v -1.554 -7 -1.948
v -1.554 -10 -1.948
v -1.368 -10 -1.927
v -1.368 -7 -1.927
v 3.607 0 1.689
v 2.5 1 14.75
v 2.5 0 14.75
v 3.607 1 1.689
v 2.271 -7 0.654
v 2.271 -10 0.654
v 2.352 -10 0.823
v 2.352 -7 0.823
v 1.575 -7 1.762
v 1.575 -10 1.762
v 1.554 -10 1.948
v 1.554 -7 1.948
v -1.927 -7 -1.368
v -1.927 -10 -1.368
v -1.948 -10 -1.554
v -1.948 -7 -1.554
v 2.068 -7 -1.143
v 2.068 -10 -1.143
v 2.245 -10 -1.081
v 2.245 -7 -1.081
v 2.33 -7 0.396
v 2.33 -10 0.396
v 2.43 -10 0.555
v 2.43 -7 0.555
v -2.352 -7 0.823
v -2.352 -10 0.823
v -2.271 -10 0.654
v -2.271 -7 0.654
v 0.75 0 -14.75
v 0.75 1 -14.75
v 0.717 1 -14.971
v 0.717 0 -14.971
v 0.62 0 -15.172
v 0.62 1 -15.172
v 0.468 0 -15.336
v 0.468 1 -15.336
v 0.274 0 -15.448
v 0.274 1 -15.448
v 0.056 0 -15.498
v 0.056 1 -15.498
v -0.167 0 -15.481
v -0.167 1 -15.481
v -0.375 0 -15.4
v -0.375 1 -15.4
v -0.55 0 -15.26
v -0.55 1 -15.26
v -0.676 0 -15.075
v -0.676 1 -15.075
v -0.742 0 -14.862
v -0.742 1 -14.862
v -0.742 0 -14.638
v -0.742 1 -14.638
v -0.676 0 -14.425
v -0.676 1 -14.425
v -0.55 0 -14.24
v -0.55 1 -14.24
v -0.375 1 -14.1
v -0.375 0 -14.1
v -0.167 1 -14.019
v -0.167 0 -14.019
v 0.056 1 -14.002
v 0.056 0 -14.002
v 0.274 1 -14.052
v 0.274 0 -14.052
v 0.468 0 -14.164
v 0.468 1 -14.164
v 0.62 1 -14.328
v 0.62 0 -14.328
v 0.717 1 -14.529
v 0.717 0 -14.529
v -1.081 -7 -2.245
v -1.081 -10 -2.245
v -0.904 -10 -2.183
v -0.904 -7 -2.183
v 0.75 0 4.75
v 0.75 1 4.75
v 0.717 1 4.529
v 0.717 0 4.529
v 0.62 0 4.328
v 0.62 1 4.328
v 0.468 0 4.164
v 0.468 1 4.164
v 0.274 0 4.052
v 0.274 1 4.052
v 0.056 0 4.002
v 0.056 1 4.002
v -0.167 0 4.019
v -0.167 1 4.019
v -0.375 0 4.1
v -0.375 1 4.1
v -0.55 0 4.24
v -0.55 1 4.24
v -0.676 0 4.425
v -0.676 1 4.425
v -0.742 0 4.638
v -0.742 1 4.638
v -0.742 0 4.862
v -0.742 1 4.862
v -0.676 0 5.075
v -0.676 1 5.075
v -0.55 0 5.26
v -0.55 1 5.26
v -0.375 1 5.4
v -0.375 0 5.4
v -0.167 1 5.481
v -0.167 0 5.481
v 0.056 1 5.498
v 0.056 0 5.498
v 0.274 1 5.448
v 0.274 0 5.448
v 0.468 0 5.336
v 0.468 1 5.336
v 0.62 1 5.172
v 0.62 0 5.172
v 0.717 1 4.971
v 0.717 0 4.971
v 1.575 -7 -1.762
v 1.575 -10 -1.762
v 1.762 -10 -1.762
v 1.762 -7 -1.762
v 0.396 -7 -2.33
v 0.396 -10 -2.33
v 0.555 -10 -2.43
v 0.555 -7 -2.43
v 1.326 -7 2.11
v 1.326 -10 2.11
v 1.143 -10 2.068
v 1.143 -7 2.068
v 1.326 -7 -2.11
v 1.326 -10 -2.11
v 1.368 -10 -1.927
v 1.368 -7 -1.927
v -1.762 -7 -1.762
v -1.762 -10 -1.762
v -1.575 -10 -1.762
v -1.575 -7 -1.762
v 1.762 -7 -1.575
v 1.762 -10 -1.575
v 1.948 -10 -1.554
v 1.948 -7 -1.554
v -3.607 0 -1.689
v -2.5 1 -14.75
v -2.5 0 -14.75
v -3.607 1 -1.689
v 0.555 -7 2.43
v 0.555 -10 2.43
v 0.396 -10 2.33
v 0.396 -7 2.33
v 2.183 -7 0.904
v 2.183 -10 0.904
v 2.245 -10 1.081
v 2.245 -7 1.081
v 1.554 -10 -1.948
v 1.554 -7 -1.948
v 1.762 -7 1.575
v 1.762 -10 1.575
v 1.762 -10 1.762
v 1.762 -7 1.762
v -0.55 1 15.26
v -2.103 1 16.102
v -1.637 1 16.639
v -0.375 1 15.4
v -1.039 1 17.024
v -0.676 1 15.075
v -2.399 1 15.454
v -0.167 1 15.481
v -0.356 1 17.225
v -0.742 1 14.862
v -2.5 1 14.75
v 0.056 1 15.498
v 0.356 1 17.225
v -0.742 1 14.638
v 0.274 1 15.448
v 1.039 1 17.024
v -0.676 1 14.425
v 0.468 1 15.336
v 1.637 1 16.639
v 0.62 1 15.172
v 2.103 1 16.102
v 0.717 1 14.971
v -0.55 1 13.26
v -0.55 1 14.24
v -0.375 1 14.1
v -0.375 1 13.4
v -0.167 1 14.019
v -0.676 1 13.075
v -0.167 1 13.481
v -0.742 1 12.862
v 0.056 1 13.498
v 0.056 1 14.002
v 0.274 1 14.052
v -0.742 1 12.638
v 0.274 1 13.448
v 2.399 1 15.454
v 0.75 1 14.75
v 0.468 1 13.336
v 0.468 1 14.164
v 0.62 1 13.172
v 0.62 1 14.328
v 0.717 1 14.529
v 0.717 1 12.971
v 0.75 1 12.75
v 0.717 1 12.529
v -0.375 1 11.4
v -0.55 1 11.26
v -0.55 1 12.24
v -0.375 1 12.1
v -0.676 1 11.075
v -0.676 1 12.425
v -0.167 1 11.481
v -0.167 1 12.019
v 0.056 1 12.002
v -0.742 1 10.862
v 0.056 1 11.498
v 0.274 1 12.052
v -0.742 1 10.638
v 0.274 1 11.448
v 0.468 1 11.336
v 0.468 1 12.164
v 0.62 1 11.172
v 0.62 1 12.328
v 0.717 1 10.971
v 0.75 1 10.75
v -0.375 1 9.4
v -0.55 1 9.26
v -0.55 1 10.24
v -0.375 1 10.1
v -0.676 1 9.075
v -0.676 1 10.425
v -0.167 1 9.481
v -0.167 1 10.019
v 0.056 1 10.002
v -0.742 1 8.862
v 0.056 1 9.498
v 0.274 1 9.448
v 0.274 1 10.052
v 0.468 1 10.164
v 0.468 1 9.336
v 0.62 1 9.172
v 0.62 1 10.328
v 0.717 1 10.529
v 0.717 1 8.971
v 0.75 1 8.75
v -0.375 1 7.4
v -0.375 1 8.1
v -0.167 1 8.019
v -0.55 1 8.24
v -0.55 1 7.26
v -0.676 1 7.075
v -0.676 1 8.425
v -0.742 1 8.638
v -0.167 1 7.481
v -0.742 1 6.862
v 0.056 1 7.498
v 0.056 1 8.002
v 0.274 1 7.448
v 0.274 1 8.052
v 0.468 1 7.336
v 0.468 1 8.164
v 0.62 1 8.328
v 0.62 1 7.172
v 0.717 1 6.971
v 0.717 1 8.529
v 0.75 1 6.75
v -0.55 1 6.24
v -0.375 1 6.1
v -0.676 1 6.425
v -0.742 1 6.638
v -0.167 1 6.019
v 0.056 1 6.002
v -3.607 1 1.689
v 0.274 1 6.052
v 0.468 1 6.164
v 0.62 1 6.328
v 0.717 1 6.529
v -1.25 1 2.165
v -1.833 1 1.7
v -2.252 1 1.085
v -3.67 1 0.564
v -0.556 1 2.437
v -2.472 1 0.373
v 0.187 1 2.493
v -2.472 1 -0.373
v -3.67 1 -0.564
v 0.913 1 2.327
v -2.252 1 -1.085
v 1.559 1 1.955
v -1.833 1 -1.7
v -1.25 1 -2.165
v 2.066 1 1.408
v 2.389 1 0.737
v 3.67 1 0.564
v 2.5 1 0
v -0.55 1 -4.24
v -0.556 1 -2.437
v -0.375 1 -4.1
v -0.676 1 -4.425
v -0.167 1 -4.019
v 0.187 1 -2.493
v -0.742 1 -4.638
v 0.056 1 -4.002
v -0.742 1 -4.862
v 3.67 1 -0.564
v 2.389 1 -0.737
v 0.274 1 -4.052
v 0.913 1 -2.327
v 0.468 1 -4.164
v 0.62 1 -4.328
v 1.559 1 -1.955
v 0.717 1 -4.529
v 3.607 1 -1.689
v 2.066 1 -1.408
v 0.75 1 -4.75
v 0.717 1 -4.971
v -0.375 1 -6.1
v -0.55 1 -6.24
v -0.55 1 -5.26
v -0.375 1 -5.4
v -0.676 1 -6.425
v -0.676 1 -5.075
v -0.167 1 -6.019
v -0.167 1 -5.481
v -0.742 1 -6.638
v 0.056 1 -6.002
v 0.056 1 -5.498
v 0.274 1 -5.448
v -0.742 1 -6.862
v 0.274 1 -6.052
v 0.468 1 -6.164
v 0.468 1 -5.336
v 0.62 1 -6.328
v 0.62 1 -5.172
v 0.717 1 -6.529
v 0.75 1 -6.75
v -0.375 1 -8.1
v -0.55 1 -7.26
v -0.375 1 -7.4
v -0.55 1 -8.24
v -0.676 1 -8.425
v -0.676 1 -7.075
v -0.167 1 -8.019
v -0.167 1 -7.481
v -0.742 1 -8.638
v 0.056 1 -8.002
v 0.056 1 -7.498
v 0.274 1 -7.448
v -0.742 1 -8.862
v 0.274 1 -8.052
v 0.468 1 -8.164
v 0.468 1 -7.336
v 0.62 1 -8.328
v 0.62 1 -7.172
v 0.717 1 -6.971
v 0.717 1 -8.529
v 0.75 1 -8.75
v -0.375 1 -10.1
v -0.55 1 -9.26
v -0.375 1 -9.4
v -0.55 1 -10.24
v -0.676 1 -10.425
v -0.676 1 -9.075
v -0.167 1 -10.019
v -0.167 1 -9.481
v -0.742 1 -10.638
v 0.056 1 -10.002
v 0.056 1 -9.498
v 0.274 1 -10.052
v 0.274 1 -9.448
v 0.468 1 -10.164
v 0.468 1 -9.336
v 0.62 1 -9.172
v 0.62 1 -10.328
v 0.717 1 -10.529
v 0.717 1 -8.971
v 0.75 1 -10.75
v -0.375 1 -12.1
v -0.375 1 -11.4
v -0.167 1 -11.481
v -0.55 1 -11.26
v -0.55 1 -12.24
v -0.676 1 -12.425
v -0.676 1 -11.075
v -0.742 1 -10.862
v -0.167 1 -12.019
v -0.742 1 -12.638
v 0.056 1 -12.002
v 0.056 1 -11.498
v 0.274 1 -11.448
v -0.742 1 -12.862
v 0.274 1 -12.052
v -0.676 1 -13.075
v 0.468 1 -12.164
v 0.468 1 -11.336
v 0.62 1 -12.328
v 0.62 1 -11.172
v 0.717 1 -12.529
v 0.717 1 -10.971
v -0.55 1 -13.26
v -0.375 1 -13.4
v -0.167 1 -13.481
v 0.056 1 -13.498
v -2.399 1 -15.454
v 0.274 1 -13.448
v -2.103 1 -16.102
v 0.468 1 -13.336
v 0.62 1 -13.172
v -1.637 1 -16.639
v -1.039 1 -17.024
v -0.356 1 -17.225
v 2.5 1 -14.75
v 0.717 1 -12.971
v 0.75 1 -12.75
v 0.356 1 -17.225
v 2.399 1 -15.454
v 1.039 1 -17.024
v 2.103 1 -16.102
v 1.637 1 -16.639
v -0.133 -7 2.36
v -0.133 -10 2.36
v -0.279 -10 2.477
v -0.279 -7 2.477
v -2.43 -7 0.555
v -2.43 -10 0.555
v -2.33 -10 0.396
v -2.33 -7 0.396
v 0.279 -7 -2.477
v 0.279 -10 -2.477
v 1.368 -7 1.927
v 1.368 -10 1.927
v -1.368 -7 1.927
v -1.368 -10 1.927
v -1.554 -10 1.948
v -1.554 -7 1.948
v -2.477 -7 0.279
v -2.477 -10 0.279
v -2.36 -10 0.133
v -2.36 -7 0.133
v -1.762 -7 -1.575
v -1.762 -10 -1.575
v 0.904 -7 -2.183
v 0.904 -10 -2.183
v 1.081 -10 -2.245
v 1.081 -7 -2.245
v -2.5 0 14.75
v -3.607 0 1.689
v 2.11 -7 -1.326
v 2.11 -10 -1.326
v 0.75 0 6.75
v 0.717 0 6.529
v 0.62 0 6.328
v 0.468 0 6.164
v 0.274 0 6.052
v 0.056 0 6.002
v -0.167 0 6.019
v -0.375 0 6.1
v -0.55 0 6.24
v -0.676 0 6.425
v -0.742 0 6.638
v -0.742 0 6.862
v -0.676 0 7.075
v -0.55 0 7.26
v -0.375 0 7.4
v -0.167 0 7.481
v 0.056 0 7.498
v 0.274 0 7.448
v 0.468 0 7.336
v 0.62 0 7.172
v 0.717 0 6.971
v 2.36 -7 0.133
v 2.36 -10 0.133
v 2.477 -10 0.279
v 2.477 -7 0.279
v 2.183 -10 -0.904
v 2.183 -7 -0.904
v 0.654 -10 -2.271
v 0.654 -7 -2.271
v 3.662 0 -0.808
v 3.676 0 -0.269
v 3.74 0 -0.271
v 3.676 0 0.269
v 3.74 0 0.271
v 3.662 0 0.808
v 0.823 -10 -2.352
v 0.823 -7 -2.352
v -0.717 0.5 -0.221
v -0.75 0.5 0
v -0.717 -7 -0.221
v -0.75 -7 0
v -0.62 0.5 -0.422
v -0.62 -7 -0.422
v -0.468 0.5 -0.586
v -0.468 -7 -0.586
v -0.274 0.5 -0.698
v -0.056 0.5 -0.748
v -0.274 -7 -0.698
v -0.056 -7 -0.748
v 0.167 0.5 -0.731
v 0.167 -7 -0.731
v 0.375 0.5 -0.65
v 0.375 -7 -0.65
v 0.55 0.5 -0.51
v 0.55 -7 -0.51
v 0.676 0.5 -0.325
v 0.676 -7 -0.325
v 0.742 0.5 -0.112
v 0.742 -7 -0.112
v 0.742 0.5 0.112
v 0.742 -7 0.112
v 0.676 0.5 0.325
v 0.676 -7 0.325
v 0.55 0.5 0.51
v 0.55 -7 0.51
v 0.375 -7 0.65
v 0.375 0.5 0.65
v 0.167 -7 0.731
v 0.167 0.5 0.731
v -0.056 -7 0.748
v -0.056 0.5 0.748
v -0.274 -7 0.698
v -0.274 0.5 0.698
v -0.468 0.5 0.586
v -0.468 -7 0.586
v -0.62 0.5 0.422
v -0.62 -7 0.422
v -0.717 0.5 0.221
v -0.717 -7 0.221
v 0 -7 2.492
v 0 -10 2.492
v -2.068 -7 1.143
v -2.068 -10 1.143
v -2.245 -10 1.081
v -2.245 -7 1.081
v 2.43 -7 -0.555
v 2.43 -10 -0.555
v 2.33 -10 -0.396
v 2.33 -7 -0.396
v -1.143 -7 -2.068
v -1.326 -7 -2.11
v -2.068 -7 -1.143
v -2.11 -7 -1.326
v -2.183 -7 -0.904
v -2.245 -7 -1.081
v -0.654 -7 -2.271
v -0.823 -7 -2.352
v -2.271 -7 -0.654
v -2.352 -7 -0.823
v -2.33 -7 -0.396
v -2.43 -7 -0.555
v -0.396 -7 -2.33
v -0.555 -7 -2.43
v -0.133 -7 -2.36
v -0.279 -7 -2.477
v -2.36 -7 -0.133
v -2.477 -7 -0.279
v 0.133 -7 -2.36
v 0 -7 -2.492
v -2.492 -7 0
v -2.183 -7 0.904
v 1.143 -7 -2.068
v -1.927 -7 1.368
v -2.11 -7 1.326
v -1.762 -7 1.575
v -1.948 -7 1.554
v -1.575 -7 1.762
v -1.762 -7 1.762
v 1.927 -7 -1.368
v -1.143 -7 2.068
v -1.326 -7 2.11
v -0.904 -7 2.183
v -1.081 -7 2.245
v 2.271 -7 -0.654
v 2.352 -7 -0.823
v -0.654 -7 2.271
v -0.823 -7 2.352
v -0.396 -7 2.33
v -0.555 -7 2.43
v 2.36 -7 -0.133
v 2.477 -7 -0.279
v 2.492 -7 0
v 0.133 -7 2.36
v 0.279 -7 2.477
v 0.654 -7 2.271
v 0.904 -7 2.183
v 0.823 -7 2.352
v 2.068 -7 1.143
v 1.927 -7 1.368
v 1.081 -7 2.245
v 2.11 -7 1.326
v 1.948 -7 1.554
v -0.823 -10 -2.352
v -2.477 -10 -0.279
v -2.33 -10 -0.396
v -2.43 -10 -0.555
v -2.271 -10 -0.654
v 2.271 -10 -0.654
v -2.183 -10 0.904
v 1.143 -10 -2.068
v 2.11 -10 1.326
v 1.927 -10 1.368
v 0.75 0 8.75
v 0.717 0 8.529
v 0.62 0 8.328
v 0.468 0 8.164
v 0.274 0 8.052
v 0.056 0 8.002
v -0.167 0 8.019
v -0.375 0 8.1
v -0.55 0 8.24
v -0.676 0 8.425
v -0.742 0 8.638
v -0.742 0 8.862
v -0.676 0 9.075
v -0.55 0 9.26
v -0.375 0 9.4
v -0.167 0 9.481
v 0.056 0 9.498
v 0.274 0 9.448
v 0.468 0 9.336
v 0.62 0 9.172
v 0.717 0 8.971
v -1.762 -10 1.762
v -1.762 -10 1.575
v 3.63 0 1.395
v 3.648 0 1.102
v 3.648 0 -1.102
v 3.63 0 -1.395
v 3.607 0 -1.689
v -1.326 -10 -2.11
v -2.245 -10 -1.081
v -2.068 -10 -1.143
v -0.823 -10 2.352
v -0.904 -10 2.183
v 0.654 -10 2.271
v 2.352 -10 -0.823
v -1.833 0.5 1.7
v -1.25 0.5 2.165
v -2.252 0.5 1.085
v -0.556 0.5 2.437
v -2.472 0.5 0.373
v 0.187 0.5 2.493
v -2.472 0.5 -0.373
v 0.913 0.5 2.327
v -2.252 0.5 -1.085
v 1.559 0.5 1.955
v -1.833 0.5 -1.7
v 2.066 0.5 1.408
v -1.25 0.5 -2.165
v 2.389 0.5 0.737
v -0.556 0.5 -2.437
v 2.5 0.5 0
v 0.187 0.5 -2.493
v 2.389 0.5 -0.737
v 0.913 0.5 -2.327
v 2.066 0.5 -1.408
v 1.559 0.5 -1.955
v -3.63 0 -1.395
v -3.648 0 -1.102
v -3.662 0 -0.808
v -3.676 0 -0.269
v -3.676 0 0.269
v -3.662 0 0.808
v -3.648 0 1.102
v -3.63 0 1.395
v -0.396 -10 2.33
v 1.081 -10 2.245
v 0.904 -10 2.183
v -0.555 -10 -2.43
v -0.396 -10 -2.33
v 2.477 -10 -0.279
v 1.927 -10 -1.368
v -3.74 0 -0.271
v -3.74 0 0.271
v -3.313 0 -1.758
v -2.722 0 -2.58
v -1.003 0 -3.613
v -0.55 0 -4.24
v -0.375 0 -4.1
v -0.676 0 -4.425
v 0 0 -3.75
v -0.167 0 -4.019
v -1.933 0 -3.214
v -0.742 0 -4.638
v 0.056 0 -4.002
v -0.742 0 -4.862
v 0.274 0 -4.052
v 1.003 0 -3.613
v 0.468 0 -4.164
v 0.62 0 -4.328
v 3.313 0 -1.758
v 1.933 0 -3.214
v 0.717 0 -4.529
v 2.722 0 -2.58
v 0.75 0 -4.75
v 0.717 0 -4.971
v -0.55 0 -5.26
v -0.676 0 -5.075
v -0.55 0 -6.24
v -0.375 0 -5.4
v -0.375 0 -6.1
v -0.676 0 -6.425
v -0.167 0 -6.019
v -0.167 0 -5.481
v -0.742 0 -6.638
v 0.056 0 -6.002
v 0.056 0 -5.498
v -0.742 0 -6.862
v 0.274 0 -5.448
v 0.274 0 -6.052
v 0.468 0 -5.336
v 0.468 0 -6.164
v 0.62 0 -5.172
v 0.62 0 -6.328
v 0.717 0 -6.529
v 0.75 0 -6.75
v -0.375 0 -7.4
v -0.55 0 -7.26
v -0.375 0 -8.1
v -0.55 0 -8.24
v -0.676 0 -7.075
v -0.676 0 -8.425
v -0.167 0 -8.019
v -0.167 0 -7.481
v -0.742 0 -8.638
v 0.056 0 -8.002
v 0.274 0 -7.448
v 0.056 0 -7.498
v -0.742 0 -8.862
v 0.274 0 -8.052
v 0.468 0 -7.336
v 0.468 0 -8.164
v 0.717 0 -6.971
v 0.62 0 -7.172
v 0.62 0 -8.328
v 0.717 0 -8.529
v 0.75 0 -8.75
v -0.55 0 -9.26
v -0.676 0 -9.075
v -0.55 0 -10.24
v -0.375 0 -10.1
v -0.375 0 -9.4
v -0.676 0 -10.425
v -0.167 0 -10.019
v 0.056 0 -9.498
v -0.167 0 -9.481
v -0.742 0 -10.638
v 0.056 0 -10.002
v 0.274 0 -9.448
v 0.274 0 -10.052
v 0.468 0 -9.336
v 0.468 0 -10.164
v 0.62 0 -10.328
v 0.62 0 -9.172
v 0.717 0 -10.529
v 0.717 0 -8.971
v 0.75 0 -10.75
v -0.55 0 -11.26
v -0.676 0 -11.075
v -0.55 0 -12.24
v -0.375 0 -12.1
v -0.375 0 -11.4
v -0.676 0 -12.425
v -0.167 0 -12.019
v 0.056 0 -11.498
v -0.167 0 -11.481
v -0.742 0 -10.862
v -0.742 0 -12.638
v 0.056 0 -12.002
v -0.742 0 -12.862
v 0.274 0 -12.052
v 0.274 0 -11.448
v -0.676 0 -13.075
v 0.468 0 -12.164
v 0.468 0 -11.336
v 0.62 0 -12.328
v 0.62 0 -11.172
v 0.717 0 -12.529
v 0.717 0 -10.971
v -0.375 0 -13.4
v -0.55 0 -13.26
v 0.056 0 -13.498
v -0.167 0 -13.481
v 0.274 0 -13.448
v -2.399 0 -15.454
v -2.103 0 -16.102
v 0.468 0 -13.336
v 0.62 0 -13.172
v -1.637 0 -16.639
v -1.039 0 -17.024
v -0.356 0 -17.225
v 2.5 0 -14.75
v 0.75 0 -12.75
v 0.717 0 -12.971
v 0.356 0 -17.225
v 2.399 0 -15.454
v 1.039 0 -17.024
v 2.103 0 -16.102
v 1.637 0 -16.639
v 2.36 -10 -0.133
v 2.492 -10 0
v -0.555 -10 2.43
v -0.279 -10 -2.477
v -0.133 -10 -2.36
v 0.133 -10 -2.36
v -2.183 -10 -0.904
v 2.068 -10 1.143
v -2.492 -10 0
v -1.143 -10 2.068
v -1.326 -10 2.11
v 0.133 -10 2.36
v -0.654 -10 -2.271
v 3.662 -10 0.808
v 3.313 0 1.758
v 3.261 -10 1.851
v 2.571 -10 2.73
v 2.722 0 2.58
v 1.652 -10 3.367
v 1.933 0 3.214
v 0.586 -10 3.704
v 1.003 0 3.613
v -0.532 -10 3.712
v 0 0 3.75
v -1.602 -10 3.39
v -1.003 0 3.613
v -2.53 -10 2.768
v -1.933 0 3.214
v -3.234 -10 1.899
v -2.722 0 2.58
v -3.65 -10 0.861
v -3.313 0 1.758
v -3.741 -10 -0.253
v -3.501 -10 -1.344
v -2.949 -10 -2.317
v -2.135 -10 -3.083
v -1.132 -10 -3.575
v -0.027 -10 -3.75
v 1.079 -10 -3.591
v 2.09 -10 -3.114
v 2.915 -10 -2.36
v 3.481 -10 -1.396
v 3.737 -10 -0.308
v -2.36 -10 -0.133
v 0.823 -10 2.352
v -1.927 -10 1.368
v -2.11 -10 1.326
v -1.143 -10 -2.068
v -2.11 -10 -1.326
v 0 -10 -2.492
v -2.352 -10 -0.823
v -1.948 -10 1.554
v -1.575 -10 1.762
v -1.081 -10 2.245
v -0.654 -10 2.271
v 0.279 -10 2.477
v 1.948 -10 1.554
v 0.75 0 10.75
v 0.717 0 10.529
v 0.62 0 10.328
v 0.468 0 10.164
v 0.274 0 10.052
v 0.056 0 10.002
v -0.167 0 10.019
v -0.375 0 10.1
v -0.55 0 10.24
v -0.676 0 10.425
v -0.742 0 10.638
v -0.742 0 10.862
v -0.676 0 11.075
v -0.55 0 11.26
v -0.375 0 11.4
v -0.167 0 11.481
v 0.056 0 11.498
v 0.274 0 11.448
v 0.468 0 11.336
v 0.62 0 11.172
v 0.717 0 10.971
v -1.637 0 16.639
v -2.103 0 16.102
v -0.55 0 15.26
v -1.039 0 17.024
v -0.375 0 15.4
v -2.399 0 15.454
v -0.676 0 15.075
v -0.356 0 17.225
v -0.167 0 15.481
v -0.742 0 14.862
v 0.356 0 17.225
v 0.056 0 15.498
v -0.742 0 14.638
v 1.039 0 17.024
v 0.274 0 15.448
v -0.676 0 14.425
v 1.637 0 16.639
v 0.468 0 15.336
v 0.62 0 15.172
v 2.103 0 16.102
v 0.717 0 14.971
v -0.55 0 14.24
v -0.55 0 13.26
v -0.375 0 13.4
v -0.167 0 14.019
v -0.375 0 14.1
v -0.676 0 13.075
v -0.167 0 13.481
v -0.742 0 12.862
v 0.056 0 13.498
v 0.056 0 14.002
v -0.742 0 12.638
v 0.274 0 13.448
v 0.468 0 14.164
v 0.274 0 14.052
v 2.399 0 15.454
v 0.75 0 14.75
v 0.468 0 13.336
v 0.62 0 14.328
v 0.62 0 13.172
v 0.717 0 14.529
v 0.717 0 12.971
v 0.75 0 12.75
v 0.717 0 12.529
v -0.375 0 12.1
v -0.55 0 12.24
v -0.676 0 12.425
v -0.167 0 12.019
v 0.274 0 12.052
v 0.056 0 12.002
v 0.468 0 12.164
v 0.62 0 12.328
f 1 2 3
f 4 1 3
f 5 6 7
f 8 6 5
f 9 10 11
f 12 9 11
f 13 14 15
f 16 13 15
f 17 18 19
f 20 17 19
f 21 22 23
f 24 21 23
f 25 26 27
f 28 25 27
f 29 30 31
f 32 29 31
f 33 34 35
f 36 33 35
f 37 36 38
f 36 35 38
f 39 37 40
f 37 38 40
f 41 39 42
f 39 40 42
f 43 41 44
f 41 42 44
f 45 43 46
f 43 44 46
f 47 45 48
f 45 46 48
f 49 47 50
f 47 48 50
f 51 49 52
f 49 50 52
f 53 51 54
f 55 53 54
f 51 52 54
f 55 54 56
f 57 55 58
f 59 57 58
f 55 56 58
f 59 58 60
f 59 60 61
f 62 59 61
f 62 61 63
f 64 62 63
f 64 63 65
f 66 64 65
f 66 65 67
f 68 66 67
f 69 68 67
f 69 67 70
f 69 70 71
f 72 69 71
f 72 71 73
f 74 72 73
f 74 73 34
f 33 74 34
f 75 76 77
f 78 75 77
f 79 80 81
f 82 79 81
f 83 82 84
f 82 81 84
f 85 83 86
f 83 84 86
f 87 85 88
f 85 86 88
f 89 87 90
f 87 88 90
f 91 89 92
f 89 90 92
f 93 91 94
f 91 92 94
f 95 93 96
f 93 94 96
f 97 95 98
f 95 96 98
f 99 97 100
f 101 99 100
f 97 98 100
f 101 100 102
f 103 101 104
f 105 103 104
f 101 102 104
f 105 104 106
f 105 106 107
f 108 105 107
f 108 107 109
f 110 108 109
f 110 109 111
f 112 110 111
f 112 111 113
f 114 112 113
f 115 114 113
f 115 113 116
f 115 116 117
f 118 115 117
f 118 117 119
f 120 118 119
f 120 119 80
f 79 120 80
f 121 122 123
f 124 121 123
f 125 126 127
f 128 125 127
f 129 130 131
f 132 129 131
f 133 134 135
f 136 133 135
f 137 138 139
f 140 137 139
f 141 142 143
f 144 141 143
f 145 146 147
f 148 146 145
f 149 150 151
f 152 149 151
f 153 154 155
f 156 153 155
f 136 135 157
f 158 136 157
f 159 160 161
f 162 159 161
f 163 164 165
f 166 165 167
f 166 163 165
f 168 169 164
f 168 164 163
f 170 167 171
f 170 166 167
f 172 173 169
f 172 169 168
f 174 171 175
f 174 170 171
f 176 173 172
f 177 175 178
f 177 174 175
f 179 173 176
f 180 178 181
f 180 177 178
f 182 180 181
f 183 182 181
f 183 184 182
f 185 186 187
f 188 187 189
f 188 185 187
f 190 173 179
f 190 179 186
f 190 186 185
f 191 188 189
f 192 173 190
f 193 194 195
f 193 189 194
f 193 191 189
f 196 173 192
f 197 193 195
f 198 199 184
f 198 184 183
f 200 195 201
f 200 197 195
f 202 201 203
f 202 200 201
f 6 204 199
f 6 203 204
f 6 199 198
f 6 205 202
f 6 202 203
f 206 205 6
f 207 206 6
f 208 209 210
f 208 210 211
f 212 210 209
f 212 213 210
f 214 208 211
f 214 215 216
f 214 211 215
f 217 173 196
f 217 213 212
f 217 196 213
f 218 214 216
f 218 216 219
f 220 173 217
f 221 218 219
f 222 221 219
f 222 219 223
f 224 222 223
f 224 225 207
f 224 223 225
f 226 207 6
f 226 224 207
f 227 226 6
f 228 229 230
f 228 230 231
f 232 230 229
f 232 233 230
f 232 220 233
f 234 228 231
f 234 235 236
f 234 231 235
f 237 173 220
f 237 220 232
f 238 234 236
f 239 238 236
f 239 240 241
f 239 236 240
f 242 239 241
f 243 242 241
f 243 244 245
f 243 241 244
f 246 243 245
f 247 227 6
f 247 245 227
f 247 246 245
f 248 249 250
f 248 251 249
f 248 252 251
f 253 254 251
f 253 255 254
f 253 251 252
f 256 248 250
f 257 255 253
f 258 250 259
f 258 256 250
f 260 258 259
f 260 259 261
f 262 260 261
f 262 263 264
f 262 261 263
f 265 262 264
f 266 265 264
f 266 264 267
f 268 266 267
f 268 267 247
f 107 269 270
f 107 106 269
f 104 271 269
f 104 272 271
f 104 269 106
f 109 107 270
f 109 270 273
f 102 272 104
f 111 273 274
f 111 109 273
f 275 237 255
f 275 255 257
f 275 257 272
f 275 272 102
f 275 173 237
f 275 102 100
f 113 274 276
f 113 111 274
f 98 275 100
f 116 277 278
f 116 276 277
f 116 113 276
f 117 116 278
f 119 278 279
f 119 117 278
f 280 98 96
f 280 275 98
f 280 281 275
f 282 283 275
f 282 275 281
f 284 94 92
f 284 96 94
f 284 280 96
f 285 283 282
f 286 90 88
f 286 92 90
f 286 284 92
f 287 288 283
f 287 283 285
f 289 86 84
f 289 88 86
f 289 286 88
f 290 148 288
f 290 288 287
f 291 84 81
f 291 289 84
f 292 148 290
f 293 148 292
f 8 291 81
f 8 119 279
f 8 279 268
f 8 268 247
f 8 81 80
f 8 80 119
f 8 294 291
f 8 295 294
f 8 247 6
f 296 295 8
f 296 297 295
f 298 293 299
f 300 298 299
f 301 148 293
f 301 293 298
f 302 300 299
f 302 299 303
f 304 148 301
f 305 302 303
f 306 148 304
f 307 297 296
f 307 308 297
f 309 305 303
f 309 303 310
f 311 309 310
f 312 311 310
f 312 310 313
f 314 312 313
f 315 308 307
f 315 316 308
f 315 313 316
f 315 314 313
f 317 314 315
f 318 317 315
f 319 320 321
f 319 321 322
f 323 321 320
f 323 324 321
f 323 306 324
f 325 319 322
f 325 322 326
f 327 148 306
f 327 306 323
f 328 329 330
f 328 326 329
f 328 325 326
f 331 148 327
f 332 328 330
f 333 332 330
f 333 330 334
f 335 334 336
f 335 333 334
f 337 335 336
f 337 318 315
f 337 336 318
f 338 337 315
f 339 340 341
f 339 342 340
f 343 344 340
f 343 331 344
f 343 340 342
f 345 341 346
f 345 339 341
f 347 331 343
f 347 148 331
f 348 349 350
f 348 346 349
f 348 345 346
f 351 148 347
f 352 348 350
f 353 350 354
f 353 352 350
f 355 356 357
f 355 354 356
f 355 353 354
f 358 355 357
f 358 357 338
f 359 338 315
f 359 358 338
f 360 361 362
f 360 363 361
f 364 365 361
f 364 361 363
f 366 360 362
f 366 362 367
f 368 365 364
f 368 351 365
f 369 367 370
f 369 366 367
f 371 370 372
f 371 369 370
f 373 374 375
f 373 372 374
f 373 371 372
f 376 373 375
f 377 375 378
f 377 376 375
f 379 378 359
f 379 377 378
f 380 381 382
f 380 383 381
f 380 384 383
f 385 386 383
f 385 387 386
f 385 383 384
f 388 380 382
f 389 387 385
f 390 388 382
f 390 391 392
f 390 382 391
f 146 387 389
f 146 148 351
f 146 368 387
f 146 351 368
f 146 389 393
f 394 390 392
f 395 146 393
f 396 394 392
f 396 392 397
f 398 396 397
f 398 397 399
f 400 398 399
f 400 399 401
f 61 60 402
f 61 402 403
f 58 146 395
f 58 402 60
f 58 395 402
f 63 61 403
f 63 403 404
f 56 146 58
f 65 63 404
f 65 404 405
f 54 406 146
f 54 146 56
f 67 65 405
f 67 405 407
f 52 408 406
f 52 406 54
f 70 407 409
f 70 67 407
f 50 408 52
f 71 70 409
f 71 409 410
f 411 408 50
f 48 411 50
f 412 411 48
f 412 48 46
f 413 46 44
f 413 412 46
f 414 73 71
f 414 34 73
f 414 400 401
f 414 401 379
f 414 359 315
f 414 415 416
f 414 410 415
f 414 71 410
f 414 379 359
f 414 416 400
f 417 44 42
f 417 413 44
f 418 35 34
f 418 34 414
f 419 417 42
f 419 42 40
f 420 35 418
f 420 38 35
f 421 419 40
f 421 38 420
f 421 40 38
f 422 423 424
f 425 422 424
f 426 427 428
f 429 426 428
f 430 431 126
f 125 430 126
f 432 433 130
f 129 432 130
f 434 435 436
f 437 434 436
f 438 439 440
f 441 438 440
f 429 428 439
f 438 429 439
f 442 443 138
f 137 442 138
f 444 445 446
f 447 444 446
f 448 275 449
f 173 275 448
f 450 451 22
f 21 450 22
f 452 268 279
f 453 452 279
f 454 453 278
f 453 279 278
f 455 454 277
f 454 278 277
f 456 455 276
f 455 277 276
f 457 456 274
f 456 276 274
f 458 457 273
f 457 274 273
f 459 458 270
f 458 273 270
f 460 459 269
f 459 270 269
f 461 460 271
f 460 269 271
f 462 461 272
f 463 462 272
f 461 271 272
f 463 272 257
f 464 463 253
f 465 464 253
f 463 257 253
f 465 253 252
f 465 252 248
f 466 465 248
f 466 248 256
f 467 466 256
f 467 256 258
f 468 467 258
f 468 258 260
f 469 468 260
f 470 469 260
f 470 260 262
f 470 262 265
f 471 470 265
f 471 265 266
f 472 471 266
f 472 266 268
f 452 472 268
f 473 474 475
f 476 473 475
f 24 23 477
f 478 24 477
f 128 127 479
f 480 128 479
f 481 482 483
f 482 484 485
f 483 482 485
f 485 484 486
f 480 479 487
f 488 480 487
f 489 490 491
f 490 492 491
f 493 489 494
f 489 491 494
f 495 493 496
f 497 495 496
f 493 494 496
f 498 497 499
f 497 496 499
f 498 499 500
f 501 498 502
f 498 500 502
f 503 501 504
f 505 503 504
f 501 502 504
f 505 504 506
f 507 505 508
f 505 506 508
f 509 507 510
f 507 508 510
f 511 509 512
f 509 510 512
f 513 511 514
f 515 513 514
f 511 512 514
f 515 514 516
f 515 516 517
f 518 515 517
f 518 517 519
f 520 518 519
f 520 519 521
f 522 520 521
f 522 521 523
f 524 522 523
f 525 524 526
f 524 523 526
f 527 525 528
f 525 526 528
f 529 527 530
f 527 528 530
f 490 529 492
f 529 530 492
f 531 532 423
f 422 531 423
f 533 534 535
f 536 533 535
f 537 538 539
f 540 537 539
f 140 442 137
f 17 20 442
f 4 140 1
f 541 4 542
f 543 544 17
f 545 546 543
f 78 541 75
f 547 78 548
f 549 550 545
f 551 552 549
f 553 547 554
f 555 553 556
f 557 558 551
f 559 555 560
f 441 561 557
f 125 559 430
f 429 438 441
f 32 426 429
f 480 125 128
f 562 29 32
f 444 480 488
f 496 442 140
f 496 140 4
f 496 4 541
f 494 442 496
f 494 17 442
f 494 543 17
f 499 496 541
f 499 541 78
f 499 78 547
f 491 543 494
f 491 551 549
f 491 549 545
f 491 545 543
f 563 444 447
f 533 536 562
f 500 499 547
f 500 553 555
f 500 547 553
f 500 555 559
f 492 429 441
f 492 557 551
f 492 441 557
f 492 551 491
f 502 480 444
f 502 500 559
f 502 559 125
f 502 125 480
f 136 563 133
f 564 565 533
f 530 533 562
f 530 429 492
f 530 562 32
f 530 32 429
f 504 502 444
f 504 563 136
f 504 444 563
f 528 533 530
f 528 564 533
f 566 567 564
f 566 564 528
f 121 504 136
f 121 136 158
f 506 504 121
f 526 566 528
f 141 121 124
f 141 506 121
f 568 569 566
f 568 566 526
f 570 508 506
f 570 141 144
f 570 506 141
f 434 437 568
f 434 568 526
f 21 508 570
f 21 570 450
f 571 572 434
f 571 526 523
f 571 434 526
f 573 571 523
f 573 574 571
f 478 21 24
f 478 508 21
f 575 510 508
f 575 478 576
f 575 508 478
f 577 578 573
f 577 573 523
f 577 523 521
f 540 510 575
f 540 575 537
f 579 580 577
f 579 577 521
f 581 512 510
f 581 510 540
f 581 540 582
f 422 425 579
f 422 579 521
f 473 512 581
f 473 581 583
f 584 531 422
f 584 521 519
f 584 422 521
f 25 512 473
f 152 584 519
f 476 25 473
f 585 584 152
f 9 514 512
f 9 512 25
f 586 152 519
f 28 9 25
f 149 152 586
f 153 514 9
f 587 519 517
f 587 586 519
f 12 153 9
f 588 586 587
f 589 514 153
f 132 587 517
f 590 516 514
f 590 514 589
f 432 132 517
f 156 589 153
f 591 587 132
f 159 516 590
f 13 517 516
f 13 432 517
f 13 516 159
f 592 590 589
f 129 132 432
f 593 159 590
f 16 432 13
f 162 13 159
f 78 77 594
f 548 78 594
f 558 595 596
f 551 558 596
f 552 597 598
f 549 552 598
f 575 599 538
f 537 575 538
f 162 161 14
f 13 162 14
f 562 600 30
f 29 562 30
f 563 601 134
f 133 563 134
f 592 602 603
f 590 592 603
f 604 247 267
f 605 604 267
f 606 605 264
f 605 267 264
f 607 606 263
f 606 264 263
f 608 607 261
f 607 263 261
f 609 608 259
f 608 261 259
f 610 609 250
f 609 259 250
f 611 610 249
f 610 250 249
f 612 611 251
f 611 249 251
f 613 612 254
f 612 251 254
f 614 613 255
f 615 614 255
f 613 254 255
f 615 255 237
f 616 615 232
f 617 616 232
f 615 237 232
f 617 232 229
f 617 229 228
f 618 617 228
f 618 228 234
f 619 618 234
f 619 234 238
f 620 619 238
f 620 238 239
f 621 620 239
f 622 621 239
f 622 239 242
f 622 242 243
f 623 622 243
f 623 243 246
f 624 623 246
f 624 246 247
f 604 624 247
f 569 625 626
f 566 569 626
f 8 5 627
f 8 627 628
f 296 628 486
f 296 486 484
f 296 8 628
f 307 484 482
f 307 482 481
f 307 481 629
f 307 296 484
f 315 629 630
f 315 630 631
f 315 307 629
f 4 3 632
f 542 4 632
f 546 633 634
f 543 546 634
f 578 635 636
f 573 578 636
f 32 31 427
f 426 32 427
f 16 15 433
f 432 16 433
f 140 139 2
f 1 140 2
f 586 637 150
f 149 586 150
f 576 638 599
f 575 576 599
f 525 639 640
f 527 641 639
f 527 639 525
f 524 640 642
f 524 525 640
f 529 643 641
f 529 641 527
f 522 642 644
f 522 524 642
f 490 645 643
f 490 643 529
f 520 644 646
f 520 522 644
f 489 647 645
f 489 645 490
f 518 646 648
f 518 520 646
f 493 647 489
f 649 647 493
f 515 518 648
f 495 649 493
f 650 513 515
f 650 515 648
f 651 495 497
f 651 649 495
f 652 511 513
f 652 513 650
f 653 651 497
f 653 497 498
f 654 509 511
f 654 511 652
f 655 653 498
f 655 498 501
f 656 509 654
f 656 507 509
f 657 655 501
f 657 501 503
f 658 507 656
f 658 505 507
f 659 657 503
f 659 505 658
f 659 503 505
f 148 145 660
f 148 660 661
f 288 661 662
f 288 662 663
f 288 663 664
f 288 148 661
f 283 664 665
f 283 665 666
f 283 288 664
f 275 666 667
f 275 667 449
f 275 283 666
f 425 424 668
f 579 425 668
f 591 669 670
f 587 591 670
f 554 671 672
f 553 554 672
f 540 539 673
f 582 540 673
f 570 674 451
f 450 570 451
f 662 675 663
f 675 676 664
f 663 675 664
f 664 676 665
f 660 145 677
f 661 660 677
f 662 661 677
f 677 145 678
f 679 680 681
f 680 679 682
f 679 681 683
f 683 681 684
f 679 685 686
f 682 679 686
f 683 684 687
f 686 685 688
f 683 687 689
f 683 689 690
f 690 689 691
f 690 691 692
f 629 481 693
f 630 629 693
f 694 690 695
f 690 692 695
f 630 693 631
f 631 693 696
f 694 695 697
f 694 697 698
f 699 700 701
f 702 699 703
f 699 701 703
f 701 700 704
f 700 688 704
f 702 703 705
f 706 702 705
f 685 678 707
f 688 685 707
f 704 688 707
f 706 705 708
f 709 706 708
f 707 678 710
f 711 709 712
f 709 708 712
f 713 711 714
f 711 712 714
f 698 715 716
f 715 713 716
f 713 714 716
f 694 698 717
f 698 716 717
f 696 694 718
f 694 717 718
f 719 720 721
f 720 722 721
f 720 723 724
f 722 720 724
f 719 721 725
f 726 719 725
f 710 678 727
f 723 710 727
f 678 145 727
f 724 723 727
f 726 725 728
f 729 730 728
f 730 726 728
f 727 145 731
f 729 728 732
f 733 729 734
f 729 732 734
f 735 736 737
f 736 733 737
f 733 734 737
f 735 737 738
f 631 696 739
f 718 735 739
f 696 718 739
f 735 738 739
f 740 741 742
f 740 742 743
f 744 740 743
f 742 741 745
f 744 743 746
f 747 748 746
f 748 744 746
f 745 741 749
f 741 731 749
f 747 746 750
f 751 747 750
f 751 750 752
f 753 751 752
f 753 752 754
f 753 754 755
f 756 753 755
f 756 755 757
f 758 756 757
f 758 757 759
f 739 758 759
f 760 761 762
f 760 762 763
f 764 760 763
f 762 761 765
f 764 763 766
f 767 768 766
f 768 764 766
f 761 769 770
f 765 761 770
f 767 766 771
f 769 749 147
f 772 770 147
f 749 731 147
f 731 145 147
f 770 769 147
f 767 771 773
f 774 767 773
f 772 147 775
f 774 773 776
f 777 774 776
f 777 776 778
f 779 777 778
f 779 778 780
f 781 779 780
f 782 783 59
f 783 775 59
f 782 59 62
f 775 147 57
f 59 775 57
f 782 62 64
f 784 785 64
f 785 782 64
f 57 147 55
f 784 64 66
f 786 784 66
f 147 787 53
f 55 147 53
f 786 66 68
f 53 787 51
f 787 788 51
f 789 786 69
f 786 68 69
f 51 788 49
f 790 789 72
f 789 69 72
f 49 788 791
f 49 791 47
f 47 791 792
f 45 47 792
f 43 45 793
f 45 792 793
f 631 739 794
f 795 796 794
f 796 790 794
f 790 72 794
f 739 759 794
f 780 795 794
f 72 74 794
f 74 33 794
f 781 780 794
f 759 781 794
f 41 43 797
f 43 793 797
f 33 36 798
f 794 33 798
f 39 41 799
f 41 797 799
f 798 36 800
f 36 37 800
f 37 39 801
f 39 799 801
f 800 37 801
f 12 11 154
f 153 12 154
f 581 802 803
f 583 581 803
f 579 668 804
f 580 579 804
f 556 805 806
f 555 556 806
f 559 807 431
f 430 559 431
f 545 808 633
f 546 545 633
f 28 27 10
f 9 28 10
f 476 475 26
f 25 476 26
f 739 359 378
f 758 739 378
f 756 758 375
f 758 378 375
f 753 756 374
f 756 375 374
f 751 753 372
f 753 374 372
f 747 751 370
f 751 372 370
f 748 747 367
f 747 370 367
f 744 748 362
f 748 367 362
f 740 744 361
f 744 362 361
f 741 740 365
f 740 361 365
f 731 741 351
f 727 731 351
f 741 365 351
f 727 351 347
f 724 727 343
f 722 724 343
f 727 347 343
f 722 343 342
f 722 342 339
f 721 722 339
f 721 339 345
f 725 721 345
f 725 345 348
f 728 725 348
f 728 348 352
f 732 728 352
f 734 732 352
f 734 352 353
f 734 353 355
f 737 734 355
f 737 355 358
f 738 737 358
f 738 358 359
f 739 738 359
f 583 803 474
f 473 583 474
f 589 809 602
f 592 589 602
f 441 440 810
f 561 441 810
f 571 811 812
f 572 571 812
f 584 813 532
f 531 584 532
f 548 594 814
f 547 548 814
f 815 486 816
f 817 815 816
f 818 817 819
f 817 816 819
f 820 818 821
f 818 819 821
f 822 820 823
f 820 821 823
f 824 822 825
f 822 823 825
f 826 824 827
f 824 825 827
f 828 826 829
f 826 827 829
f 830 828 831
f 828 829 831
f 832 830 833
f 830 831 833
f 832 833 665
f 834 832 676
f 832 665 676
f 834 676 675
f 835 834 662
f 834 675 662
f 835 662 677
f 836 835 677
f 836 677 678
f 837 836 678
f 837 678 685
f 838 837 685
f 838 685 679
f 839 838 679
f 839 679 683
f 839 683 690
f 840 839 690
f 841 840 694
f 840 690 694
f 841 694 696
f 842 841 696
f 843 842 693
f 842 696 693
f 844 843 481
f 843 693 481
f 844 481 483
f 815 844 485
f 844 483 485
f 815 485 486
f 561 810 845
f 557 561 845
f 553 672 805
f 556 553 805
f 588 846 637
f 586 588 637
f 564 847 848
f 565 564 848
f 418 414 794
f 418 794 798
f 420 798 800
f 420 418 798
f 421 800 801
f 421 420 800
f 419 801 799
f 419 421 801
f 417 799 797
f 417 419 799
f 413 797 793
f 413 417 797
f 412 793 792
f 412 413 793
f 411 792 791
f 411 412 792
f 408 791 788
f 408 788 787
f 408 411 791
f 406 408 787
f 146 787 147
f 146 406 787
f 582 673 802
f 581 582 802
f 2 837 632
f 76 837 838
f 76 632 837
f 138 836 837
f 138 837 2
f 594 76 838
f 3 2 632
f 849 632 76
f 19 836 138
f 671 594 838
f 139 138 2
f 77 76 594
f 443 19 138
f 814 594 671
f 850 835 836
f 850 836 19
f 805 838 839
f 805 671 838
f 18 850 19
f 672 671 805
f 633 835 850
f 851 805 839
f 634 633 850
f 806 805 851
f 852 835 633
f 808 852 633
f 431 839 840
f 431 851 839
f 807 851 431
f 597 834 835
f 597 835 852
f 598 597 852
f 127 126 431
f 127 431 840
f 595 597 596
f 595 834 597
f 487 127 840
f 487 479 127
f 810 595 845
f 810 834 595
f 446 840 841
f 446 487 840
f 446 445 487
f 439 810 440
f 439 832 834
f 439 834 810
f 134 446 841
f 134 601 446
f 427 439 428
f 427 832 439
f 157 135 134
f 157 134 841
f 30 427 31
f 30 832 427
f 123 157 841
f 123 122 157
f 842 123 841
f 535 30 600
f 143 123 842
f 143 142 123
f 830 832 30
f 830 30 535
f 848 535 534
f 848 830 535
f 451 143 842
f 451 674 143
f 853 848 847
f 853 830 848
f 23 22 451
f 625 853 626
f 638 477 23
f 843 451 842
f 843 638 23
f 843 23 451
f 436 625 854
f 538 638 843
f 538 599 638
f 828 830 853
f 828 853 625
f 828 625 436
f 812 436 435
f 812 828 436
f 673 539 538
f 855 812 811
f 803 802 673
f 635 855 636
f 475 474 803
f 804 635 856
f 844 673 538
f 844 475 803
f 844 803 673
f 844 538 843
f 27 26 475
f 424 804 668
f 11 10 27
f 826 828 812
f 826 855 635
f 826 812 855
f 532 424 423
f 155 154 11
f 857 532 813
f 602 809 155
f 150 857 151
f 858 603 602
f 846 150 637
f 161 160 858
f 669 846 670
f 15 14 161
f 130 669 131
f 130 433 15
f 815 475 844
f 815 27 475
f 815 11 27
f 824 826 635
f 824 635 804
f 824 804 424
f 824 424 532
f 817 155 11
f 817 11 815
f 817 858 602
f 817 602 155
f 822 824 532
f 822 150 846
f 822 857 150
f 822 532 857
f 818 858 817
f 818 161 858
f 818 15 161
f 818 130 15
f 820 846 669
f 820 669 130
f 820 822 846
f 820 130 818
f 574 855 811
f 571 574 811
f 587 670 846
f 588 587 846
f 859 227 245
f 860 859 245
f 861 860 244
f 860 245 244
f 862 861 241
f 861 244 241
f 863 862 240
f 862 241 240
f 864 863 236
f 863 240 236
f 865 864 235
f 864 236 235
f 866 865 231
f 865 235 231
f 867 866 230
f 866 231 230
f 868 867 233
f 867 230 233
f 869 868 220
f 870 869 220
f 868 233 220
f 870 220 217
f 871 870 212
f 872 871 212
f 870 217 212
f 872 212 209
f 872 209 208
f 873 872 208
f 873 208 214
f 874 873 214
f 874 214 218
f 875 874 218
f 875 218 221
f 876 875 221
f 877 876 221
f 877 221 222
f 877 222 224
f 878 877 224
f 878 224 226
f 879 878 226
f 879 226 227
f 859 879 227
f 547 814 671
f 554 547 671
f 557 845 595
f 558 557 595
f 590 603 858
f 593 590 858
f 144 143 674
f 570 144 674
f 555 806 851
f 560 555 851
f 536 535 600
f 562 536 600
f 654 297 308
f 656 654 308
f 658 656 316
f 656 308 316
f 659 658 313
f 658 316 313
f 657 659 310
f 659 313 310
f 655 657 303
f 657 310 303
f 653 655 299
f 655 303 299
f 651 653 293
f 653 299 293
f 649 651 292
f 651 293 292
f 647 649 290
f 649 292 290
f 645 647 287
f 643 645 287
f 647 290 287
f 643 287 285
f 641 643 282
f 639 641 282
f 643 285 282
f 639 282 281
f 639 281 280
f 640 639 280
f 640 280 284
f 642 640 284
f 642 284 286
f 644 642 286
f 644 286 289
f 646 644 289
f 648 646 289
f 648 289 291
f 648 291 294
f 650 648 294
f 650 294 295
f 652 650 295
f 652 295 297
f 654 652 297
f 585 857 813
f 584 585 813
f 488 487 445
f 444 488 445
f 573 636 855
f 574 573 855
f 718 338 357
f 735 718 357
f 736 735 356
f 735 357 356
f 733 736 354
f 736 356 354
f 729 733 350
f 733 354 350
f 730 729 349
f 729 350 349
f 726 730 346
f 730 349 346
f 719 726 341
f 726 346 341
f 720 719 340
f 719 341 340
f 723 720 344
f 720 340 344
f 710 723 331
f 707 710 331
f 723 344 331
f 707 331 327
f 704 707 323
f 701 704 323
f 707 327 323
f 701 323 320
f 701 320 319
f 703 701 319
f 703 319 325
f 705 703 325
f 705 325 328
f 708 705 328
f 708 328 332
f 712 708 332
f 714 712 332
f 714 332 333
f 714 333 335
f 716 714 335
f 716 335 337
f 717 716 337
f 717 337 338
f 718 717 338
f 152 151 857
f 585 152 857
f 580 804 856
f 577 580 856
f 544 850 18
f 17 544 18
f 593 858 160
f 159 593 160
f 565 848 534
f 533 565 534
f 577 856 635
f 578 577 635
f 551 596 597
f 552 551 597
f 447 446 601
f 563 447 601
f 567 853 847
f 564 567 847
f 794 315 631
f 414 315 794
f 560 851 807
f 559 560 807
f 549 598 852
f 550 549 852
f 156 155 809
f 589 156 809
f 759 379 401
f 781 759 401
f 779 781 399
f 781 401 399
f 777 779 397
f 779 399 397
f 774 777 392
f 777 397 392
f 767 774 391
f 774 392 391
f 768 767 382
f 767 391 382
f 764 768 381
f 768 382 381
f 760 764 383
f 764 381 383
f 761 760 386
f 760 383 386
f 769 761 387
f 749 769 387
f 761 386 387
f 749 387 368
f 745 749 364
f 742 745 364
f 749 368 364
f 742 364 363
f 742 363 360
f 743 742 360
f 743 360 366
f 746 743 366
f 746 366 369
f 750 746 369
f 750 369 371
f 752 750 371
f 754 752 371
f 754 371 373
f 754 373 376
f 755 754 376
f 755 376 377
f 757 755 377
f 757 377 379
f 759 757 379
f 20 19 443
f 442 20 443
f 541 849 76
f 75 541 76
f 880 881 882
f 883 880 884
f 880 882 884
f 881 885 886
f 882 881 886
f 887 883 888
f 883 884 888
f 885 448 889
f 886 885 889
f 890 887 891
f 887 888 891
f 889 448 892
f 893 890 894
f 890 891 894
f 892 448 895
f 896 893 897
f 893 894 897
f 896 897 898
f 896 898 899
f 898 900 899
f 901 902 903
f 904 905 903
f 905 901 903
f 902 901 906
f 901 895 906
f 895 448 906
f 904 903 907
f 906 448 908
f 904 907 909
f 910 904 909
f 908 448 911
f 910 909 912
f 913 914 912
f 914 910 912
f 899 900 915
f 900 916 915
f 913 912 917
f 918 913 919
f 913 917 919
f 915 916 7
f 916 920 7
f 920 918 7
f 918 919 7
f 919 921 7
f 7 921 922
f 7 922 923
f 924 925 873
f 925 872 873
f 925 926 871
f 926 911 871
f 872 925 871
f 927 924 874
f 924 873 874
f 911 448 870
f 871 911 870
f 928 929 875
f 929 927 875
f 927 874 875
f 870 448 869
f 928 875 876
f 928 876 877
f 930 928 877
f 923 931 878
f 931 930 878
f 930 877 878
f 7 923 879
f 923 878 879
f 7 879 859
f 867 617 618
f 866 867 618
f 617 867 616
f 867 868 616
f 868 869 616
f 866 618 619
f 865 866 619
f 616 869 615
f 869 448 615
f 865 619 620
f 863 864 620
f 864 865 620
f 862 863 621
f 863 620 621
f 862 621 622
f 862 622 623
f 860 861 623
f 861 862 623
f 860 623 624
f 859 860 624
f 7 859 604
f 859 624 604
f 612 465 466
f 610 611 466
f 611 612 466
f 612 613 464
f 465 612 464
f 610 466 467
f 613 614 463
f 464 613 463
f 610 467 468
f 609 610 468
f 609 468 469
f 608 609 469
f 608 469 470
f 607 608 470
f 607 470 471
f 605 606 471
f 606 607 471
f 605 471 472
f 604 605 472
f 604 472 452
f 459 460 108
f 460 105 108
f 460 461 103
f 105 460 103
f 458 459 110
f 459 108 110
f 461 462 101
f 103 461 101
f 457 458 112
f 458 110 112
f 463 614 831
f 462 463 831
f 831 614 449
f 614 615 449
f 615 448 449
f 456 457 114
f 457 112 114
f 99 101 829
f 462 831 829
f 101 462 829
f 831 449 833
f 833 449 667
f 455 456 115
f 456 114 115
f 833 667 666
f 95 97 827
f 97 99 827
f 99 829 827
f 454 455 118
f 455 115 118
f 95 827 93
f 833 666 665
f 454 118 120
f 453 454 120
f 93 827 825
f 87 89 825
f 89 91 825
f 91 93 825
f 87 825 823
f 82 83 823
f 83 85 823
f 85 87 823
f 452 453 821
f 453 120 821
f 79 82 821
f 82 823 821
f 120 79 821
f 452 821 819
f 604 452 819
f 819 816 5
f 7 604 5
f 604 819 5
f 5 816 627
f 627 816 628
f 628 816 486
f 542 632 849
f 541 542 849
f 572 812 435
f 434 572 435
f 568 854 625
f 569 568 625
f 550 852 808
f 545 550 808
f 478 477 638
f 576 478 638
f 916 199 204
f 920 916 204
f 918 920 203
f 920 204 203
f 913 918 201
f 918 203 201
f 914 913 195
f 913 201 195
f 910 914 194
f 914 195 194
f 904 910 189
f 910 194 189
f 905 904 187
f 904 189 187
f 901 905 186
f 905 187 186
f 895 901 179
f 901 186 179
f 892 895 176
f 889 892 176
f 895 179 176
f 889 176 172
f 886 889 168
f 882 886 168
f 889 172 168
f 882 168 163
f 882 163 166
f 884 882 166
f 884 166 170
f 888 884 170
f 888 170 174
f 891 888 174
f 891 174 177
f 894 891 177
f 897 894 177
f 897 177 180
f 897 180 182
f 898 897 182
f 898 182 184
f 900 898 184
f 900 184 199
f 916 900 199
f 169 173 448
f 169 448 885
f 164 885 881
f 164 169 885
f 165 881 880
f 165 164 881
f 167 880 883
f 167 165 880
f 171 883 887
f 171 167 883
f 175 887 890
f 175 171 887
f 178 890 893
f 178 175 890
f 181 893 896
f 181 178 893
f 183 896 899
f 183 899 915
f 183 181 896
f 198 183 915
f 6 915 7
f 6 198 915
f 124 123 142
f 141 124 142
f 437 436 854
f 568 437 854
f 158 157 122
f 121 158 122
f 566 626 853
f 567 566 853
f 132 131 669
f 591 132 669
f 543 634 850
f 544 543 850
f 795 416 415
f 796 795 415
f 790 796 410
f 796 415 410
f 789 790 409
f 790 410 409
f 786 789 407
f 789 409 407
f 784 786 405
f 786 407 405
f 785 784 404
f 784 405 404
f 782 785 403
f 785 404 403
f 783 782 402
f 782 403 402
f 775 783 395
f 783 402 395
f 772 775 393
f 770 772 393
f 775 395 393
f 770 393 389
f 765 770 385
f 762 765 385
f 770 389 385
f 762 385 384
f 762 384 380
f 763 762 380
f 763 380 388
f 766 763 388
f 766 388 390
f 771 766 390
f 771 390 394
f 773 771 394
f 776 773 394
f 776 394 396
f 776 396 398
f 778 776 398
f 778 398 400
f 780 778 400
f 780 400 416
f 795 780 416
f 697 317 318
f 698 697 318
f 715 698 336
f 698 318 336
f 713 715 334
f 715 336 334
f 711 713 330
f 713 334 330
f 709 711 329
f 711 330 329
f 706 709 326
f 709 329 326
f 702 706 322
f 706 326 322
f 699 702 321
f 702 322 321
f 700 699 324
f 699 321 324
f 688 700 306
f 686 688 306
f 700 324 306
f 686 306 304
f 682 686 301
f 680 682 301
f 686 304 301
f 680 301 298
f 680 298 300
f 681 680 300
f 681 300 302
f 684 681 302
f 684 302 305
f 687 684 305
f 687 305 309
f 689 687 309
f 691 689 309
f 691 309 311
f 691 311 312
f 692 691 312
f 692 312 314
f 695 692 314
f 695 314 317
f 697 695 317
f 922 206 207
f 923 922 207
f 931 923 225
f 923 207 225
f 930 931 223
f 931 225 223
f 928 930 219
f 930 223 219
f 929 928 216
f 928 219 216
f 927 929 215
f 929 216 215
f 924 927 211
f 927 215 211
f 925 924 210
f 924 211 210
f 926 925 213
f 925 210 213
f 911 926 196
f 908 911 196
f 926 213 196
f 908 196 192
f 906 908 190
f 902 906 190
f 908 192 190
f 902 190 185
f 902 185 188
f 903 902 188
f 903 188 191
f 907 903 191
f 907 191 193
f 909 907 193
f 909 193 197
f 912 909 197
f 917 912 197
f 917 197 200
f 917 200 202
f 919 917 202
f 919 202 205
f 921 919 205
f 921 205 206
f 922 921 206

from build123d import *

# Parameters (mm, degrees)
BOSS_EXTRUDE1_DEPTH             = 1
SKETCH2_R                       = 3.75
BOSS_EXTRUDE2_DEPTH             = 10
CUT_EXTRUDE1_DEPTH              = 3
DRAFT1_ANGLE                    = 6.428571429
DRAFT2_ANGLE                    = 6.428571429
DRAFT3_ANGLE                    = 6.428571429
DRAFT4_ANGLE                    = 6.428571429
DRAFT5_ANGLE                    = 6.428571429
DRAFT6_ANGLE                    = 6.428571429
DRAFT7_ANGLE                    = 6.428571429
DRAFT8_ANGLE                    = 6.428571429
F_1_5_1_5_DIAMETER_HOLE1_D      = 1.5
M5X0_8_TAPPED_HOLE1_D           = 1.5
M5X0_8_TAPPED_HOLE1_DEPTH       = 11
M5X0_8_TAPPED_HOLE1_CBORE_D     = 5
M5X0_8_TAPPED_HOLE1_CBORE_DEPTH = 0.5


with BuildPart() as part:
    # Sketch1 → Boss-Extrude1 (new body)
    with BuildSketch(Plane(origin=(0, 1, 0), x_dir=(1, 0, 0), z_dir=(0, 1, 0))):
        with BuildLine():
            Line((-2.5, 14.75), (-3.606876141, 1.688861534))
            ThreePointArc((-3.606876141, 1.688861534), (-3.678310043, 0), (-3.606876141, -1.688861534))
            Line((-3.606876141, -1.688861534), (-2.5, -14.75))
            ThreePointArc((-2.5, -14.75), (0, -17.25), (2.5, -14.75))
            Line((2.5, -14.75), (3.606876141, -1.688861534))
            ThreePointArc((3.606876141, -1.688861534), (3.678310043, 0), (3.606876141, 1.688861534))
            Line((3.606876141, 1.688861534), (2.5, 14.75))
            ThreePointArc((2.5, 14.75), (0, 17.25), (-2.5, 14.75))
        make_face()
    extrude(amount=-BOSS_EXTRUDE1_DEPTH)

    # Sketch2 → Boss-Extrude2 (add)
    with BuildSketch(Plane.XZ):
        with Locations(Location((0, 0, 0), (0, 0, 12.437280395))):
            Circle(SKETCH2_R)
    extrude(amount=BOSS_EXTRUDE2_DEPTH)

    # Sketch3 → Cut-Extrude1 (cut)
    with BuildSketch(Plane.XZ.offset(10)):
        Polygon((0.132515428, 2.359655809), (0, 2.492171237), (-0.132515428, 2.359655809), (-0.279034647, 2.476500987), (-0.395879825, 2.329981768), (-0.554560271, 2.4296873), (-0.654265804, 2.271006854), (-0.823111978, 2.352318886), (-0.90442401, 2.183472712), (-1.081312575, 2.245368698), (-1.14320856, 2.068480133), (-1.325915038, 2.110181695), (-1.367616599, 1.927475217), (-1.574826066, 1.950822117), (-1.574826066, 1.762231181), (-1.762231181, 1.762231181), (-1.762231181, 1.574826066), (-1.950822117, 1.574826066), (-1.927475217, 1.367616599), (-2.110181695, 1.325915038), (-2.068480133, 1.14320856), (-2.245368698, 1.081312575), (-2.183472712, 0.90442401), (-2.352318886, 0.823111978), (-2.271006854, 0.654265804), (-2.4296873, 0.554560271), (-2.329981768, 0.395879825), (-2.476500987, 0.279034647), (-2.359655809, 0.132515428), (-2.492171237, 0), (-2.359655809, -0.132515428), (-2.476500987, -0.279034647), (-2.329981768, -0.395879825), (-2.4296873, -0.554560271), (-2.271006854, -0.654265804), (-2.352318886, -0.823111978), (-2.183472712, -0.90442401), (-2.245368698, -1.081312575), (-2.068480133, -1.14320856), (-2.110181695, -1.325915038), (-1.927475217, -1.367616599), (-1.950822117, -1.574826066), (-1.762231181, -1.574826066), (-1.762231181, -1.762231181), (-1.574826066, -1.762231181), (-1.574826066, -1.950822117), (-1.367616599, -1.927475217), (-1.325915038, -2.110181695), (-1.14320856, -2.068480133), (-1.081312575, -2.245368698), (-0.90442401, -2.183472712), (-0.823111978, -2.352318886), (-0.654265804, -2.271006854), (-0.554560271, -2.4296873), (-0.395879825, -2.329981768), (-0.279034647, -2.476500987), (-0.132515428, -2.359655809), (0, -2.492171237), (0.132515428, -2.359655809), (0.279034647, -2.476500987), (0.395879825, -2.329981768), (0.554560271, -2.4296873), (0.654265804, -2.271006854), (0.823111978, -2.352318886), (0.90442401, -2.183472712), (1.081312575, -2.245368698), (1.14320856, -2.068480133), (1.325915038, -2.110181695), (1.367616599, -1.927475217), (1.574826066, -1.950822117), (1.574826066, -1.762231181), (1.762231181, -1.762231181), (1.762231181, -1.574826066), (1.950822117, -1.574826066), (1.927475217, -1.367616599), (2.110181695, -1.325915038), (2.068480133, -1.14320856), (2.245368698, -1.081312575), (2.183472712, -0.90442401), (2.352318886, -0.823111978), (2.271006854, -0.654265804), (2.4296873, -0.554560271), (2.329981768, -0.395879825), (2.476500987, -0.279034647), (2.359655809, -0.132515428), (2.492171237, 0), (2.359655809, 0.132515428), (2.476500987, 0.279034647), (2.329981768, 0.395879825), (2.4296873, 0.554560271), (2.271006854, 0.654265804), (2.352318886, 0.823111978), (2.183472712, 0.90442401), (2.245368698, 1.081312575), (2.068480133, 1.14320856), (2.110181695, 1.325915038), (1.927475217, 1.367616599), (1.950822117, 1.574826066), (1.762231181, 1.574826066), (1.762231181, 1.762231181), (1.574826066, 1.762231181), (1.574826066, 1.950822117), (1.367616599, 1.927475217), (1.325915038, 2.110181695), (1.14320856, 2.068480133), (1.081312575, 2.245368698), (0.90442401, 2.183472712), (0.823111978, 2.352318886), (0.654265804, 2.271006854), (0.554560271, 2.4296873), (0.395879825, 2.329981768), (0.279034647, 2.476500987), align=None)
    extrude(amount=-CUT_EXTRUDE1_DEPTH, mode=Mode.SUBTRACT)

    # Draft1
    draft1_faces = [part.faces().sort_by_distance(p)[0] for p in [
        (1.856526649, -8.5, 1.574826066),
    ]]
    draft(draft1_faces, Plane(origin=(1.762231181, -7, 1.574826066), x_dir=(0, 0, -1), z_dir=(-1, 0, 0)), DRAFT1_ANGLE)

    # Draft2
    draft2_faces = [part.faces().sort_by_distance(p)[0] for p in [
        (1.574826066, -8.5, 1.856526649),
    ]]
    draft(draft2_faces, Plane(origin=(1.762231181, -7, 1.762231181), x_dir=(-1, 0, 0), z_dir=(0, 0, -1)), DRAFT2_ANGLE)

    # Draft3
    draft3_faces = [part.faces().sort_by_distance(p)[0] for p in [
        (1.574826066, -8.5, -1.856526649),
    ]]
    draft(draft3_faces, Plane(origin=(1.574826066, -7, -1.762231181), x_dir=(1, 0, 0), z_dir=(0, 0, 1)), DRAFT3_ANGLE)

    # Draft4
    draft4_faces = [part.faces().sort_by_distance(p)[0] for p in [
        (1.856526649, -8.5, -1.574826066),
    ]]
    draft(draft4_faces, Plane(origin=(1.762231181, -7, -1.762231181), x_dir=(0, 0, -1), z_dir=(-1, 0, 0)), DRAFT4_ANGLE)

    # Draft5
    draft5_faces = [part.faces().sort_by_distance(p)[0] for p in [
        (-1.856526649, -8.5, -1.574826066),
    ]]
    draft(draft5_faces, Plane(origin=(-1.762231181, -7, -1.574826066), x_dir=(0, 0, 1), z_dir=(1, 0, 0)), DRAFT5_ANGLE)

    # Draft6
    draft6_faces = [part.faces().sort_by_distance(p)[0] for p in [
        (-1.574826066, -8.5, -1.856526649),
    ]]
    draft(draft6_faces, Plane(origin=(-1.762231181, -7, -1.762231181), x_dir=(1, 0, 0), z_dir=(0, 0, 1)), DRAFT6_ANGLE)

    # Draft7
    draft7_faces = [part.faces().sort_by_distance(p)[0] for p in [
        (-1.574826066, -8.5, 1.856526649),
    ]]
    draft(draft7_faces, Plane(origin=(-1.574826066, -7, 1.762231181), x_dir=(-1, 0, 0), z_dir=(0, 0, -1)), DRAFT7_ANGLE)

    # Draft8
    draft8_faces = [part.faces().sort_by_distance(p)[0] for p in [
        (-1.856526649, -8.5, 1.574826066),
    ]]
    draft(draft8_faces, Plane(origin=(-1.762231181, -7, 1.762231181), x_dir=(0, 0, 1), z_dir=(1, 0, 0)), DRAFT8_ANGLE)

    # Ø1.5 (1.5) Diameter Hole1 (through all)
    with Locations(Plane(origin=(0, 0, 0), x_dir=(-1, 0, 0), z_dir=(0, -1, 0))):
        with Locations((0, 14.75), (0, 12.75), (0, 10.75), (0, 8.75), (0, 6.75), (0, 4.75), (0, -4.75), (0, -6.75), (0, -8.75), (0, -10.75), (0, -12.75), (0, -14.75)):
            Hole(F_1_5_1_5_DIAMETER_HOLE1_D / 2)

    # M5x0.8 Tapped Hole1
    with Locations(Plane(origin=(0, 1, 0), x_dir=(1, 0, 0), z_dir=(0, 1, 0))):
        with Locations((0, 0)):
            CounterBoreHole(M5X0_8_TAPPED_HOLE1_D / 2, M5X0_8_TAPPED_HOLE1_CBORE_D / 2, M5X0_8_TAPPED_HOLE1_CBORE_DEPTH, depth=M5X0_8_TAPPED_HOLE1_DEPTH)


solid = part.part
